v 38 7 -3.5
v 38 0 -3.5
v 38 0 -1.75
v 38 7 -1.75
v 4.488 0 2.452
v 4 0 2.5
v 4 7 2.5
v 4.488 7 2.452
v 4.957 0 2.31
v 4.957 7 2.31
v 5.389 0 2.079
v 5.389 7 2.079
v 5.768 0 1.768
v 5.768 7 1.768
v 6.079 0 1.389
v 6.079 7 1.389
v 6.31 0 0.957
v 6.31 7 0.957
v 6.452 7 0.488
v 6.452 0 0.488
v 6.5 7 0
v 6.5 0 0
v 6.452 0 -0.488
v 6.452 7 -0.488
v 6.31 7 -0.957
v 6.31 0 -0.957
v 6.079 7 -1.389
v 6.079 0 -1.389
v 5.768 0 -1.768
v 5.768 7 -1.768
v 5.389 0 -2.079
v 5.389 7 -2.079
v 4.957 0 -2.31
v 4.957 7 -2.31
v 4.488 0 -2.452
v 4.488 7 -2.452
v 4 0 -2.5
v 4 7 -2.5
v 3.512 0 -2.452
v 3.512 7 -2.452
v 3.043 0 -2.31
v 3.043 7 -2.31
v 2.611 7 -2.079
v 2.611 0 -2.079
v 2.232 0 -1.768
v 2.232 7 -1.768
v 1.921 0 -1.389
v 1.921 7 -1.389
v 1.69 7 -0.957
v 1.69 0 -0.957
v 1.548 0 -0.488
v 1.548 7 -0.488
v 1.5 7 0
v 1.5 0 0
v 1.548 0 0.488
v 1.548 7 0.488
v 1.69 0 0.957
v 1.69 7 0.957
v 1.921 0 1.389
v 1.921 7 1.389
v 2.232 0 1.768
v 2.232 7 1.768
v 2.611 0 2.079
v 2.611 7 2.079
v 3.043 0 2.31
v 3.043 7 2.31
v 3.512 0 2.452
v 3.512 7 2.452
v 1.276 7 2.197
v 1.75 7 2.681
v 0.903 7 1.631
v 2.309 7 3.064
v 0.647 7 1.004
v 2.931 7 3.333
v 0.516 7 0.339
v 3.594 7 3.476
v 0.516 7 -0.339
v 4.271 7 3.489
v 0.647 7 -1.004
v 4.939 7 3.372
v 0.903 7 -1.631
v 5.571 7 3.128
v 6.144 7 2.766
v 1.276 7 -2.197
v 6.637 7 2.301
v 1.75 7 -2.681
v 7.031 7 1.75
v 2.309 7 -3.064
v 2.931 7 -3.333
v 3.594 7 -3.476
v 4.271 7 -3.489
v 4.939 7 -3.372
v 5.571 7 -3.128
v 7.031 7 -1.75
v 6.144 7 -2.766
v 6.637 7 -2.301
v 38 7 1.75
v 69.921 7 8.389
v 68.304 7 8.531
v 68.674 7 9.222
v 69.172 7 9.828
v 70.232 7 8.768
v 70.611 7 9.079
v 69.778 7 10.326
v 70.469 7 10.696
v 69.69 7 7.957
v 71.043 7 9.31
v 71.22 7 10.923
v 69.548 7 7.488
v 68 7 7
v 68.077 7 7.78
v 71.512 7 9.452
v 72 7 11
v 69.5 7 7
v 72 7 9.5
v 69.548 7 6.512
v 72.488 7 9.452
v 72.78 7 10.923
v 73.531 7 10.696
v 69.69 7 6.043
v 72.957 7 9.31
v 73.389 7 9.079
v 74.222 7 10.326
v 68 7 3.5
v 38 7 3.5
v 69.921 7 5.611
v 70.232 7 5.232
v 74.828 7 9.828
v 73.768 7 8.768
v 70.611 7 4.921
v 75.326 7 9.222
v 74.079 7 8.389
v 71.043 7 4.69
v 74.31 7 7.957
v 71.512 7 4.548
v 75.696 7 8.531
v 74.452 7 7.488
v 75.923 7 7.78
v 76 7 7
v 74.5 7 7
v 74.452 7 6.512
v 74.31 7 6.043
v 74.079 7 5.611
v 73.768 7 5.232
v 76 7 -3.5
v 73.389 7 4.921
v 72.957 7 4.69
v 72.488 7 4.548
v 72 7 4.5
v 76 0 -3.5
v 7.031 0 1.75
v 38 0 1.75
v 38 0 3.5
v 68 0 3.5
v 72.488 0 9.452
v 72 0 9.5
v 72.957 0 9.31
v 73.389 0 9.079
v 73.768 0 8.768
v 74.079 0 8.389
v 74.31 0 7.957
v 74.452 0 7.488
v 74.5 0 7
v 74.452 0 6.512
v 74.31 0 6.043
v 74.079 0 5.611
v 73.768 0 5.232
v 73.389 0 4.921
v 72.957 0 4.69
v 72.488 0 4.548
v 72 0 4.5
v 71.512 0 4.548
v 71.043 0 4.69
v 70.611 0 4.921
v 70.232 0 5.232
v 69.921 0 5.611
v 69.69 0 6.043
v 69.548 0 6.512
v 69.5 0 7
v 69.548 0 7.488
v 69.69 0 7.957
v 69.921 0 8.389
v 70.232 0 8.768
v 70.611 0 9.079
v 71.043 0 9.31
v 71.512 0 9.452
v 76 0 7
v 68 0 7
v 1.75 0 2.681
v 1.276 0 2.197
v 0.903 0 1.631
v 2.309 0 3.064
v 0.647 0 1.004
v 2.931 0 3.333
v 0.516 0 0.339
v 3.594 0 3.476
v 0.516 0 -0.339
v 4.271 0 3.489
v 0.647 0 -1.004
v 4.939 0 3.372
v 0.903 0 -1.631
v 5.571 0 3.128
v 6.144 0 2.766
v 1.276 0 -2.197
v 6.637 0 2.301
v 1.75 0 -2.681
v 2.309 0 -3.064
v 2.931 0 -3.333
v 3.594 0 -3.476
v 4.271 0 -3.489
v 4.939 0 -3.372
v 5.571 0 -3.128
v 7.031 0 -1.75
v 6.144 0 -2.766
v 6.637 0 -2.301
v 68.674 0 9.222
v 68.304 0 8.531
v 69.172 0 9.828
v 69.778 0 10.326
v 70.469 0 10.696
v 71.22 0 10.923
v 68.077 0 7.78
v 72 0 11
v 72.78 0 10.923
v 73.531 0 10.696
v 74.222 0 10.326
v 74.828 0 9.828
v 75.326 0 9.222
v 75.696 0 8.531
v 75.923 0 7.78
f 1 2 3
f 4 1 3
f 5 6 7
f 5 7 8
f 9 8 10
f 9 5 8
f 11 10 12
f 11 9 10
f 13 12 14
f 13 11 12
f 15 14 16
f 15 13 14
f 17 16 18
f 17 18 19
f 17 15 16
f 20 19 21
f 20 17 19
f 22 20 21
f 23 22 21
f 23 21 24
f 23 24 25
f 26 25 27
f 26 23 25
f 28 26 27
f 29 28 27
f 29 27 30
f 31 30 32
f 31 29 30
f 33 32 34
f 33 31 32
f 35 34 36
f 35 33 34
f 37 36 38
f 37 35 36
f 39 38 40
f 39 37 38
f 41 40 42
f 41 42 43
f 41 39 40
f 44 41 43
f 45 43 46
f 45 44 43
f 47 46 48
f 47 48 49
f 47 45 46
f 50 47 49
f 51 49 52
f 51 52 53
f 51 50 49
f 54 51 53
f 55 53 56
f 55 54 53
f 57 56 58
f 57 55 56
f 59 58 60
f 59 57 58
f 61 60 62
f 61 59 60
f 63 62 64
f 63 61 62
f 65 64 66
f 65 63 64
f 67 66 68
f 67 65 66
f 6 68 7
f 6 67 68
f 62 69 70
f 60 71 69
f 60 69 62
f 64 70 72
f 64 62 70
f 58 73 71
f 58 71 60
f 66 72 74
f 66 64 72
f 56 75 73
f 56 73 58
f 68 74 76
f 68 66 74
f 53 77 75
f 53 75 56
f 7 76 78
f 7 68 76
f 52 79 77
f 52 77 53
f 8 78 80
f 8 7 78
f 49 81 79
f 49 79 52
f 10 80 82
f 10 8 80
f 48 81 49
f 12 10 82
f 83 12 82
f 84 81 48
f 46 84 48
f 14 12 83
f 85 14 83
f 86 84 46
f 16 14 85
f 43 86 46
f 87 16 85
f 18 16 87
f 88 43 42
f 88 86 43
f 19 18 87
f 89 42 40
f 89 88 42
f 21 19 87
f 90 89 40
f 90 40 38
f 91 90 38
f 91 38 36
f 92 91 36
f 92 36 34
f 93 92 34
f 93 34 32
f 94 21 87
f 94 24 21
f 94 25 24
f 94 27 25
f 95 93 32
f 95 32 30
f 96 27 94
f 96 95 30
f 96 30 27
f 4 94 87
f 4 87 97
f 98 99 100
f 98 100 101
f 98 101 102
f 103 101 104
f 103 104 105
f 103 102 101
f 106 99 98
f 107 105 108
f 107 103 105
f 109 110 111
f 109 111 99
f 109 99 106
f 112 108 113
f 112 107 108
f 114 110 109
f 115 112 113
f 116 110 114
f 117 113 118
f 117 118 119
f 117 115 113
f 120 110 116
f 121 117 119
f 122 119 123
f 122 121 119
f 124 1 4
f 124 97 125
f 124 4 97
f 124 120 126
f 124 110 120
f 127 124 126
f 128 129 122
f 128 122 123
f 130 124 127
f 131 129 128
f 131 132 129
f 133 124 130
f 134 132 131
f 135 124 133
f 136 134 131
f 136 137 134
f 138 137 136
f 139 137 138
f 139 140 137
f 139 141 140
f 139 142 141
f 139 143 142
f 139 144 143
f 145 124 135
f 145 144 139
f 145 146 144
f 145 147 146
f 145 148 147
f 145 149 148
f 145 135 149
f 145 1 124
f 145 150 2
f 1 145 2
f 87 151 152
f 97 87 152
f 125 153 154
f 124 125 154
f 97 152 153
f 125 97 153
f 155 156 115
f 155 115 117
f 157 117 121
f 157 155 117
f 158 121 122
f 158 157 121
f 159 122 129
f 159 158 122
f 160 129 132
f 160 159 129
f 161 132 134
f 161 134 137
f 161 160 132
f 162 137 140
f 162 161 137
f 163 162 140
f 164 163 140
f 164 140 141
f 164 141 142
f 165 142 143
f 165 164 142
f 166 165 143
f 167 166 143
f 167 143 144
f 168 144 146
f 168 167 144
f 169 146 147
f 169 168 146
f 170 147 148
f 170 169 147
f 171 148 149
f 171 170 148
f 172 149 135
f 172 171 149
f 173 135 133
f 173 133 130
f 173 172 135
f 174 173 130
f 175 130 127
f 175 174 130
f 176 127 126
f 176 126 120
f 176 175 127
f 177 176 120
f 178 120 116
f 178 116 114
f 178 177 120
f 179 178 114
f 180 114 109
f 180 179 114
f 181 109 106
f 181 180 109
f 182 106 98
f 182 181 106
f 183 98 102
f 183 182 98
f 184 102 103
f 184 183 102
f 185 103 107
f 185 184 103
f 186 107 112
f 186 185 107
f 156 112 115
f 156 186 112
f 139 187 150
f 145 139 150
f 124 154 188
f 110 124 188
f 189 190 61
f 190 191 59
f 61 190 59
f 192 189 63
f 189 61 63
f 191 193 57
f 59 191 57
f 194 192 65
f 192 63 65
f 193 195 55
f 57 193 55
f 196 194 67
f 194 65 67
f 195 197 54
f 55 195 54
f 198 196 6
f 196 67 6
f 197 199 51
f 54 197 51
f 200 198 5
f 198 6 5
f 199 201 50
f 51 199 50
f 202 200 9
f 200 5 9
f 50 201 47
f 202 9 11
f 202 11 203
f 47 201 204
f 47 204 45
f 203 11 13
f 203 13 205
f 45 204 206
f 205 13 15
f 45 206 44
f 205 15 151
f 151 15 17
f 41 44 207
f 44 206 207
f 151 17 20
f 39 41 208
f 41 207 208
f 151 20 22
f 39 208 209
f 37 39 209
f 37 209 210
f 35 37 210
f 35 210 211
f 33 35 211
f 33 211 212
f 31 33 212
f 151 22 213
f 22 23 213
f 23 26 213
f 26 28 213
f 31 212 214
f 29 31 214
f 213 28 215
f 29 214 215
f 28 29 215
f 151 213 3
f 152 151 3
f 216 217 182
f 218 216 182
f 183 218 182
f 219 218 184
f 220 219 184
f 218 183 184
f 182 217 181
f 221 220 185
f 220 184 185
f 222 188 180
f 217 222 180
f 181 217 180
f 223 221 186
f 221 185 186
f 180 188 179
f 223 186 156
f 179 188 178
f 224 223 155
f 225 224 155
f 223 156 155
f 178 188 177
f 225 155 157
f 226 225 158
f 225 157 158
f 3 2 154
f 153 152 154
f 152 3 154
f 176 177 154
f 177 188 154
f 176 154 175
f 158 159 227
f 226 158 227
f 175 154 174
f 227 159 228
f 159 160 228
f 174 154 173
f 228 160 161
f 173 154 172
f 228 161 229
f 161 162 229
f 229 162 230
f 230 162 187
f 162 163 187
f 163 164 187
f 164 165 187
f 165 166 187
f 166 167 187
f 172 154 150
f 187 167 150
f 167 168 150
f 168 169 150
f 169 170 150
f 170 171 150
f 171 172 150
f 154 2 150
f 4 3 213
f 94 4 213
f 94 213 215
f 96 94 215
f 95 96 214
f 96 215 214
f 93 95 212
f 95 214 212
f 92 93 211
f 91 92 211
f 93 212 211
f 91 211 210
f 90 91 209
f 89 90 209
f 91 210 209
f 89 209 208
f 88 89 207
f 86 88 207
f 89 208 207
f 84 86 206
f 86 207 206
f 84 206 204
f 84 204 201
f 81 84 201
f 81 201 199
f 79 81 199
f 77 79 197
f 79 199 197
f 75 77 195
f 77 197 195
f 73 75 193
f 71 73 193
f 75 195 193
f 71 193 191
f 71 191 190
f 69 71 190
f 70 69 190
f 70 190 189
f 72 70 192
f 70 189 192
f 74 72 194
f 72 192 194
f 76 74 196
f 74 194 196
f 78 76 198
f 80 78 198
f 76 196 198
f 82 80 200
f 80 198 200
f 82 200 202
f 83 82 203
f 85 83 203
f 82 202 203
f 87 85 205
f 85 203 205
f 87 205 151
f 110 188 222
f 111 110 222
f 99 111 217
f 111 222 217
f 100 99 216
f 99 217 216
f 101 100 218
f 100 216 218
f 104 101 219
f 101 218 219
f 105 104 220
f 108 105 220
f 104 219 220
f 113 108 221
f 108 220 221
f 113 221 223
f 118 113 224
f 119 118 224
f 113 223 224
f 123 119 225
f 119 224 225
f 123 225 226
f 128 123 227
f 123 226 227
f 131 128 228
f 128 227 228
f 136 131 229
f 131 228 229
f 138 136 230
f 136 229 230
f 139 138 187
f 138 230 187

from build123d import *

# Parameters (mm, degrees)
SKETCH1_R           = 2.5
BOSS_EXTRUDE1_DEPTH = 7


with BuildPart() as part:
    # Sketch1 → Boss-Extrude1 (new body)
    with BuildSketch(Plane(origin=(0, 0, 0), x_dir=(1, 0, 0), z_dir=(0, 1, 0))):
        with BuildLine():
            Line((68, 3.5), (38, 3.5))
            Line((38, 3.5), (38, 1.75))
            Line((38, 1.75), (7.031088913, 1.75))
            ThreePointArc((7.031088913, 1.75), (0.5, 0), (7.031088913, -1.75))
            Line((7.031088913, -1.75), (38, -1.75))
            Line((38, -1.75), (38, -3.5))
            Line((38, -3.5), (68, -3.5))
            Line((68, -3.5), (68, -7))
            ThreePointArc((68, -7), (72, -11), (76, -7))
            Line((76, -7), (76, 3.5))
            Line((76, 3.5), (68, 3.5))
        make_face()
        with Locations(Location((72, -7, 0), (0, 0, 270))):
            Circle(SKETCH1_R, mode=Mode.SUBTRACT)
        with Locations(Location((4, 0, 0), (0, 0, 270))):
            Circle(SKETCH1_R, mode=Mode.SUBTRACT)
    extrude(amount=BOSS_EXTRUDE1_DEPTH)


solid = part.part
